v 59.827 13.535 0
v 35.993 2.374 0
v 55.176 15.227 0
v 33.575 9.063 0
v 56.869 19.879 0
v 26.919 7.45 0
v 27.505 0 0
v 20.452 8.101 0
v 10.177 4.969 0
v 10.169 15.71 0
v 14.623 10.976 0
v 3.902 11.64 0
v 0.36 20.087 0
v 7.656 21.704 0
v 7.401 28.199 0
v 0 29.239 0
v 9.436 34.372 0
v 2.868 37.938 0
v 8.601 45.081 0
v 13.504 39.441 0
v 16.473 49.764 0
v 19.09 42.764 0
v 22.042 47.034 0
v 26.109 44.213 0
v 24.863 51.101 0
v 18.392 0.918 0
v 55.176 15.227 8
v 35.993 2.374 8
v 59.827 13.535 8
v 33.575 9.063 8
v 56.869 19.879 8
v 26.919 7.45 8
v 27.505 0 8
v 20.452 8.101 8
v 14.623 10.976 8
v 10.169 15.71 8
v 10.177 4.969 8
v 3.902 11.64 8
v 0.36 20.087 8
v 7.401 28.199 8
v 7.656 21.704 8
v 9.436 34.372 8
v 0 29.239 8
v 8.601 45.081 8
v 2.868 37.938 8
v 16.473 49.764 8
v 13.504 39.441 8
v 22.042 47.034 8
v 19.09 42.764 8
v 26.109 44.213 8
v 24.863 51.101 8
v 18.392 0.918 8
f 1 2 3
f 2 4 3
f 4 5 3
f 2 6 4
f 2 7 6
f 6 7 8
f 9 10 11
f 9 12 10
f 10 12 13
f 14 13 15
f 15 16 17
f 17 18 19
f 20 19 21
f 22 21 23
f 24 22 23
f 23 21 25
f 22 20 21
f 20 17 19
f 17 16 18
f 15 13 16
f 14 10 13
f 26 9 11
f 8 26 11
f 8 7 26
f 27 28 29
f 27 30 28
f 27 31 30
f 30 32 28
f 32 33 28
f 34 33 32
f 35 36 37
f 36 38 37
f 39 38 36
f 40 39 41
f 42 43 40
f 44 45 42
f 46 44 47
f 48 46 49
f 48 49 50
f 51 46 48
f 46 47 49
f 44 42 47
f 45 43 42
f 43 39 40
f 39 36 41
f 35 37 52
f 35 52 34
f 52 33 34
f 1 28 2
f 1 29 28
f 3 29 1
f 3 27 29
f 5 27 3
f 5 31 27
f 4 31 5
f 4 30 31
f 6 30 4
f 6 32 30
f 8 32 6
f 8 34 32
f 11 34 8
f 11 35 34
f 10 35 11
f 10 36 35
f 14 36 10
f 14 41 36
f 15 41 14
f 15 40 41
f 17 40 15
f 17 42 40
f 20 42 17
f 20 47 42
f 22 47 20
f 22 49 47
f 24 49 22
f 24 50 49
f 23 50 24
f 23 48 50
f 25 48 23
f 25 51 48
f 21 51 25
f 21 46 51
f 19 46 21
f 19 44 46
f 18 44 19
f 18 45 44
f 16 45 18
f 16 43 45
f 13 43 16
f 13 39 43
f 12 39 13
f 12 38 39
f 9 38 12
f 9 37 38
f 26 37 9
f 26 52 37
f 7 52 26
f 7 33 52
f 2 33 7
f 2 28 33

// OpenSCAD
$fn = 32;

// ----------------------------------------------------------------------
// Hook plate: curl radius 22 mm over 205 degrees, 7 mm thick band
// ----------------------------------------------------------------------

// --- parameters (mm) ---
profile_height = 8;       // extrusion height
profile_points = 26;      // points of the closed outline

profile = [[22.042, 47.034], [24.863, 51.101], [16.473, 49.764], [8.601, 45.081], [2.868, 37.938], [0, 29.239], [0.36, 20.087], [3.902, 11.64], [10.177, 4.969], [18.392, 0.918], [27.505, 0], [35.993, 2.374], [59.827, 13.535], [55.176, 15.227], [56.869, 19.879], [33.575, 9.063], [26.919, 7.45], [20.452, 8.101], [14.623, 10.976], [10.169, 15.71], [7.656, 21.704], [7.401, 28.199], [9.436, 34.372], [13.504, 39.441], [19.09, 42.764], [26.109, 44.213]];  // single closed polygon, 26 points, counter clockwise

// --- the one profile operation ---
linear_extrude(height = profile_height) polygon(points = profile);
